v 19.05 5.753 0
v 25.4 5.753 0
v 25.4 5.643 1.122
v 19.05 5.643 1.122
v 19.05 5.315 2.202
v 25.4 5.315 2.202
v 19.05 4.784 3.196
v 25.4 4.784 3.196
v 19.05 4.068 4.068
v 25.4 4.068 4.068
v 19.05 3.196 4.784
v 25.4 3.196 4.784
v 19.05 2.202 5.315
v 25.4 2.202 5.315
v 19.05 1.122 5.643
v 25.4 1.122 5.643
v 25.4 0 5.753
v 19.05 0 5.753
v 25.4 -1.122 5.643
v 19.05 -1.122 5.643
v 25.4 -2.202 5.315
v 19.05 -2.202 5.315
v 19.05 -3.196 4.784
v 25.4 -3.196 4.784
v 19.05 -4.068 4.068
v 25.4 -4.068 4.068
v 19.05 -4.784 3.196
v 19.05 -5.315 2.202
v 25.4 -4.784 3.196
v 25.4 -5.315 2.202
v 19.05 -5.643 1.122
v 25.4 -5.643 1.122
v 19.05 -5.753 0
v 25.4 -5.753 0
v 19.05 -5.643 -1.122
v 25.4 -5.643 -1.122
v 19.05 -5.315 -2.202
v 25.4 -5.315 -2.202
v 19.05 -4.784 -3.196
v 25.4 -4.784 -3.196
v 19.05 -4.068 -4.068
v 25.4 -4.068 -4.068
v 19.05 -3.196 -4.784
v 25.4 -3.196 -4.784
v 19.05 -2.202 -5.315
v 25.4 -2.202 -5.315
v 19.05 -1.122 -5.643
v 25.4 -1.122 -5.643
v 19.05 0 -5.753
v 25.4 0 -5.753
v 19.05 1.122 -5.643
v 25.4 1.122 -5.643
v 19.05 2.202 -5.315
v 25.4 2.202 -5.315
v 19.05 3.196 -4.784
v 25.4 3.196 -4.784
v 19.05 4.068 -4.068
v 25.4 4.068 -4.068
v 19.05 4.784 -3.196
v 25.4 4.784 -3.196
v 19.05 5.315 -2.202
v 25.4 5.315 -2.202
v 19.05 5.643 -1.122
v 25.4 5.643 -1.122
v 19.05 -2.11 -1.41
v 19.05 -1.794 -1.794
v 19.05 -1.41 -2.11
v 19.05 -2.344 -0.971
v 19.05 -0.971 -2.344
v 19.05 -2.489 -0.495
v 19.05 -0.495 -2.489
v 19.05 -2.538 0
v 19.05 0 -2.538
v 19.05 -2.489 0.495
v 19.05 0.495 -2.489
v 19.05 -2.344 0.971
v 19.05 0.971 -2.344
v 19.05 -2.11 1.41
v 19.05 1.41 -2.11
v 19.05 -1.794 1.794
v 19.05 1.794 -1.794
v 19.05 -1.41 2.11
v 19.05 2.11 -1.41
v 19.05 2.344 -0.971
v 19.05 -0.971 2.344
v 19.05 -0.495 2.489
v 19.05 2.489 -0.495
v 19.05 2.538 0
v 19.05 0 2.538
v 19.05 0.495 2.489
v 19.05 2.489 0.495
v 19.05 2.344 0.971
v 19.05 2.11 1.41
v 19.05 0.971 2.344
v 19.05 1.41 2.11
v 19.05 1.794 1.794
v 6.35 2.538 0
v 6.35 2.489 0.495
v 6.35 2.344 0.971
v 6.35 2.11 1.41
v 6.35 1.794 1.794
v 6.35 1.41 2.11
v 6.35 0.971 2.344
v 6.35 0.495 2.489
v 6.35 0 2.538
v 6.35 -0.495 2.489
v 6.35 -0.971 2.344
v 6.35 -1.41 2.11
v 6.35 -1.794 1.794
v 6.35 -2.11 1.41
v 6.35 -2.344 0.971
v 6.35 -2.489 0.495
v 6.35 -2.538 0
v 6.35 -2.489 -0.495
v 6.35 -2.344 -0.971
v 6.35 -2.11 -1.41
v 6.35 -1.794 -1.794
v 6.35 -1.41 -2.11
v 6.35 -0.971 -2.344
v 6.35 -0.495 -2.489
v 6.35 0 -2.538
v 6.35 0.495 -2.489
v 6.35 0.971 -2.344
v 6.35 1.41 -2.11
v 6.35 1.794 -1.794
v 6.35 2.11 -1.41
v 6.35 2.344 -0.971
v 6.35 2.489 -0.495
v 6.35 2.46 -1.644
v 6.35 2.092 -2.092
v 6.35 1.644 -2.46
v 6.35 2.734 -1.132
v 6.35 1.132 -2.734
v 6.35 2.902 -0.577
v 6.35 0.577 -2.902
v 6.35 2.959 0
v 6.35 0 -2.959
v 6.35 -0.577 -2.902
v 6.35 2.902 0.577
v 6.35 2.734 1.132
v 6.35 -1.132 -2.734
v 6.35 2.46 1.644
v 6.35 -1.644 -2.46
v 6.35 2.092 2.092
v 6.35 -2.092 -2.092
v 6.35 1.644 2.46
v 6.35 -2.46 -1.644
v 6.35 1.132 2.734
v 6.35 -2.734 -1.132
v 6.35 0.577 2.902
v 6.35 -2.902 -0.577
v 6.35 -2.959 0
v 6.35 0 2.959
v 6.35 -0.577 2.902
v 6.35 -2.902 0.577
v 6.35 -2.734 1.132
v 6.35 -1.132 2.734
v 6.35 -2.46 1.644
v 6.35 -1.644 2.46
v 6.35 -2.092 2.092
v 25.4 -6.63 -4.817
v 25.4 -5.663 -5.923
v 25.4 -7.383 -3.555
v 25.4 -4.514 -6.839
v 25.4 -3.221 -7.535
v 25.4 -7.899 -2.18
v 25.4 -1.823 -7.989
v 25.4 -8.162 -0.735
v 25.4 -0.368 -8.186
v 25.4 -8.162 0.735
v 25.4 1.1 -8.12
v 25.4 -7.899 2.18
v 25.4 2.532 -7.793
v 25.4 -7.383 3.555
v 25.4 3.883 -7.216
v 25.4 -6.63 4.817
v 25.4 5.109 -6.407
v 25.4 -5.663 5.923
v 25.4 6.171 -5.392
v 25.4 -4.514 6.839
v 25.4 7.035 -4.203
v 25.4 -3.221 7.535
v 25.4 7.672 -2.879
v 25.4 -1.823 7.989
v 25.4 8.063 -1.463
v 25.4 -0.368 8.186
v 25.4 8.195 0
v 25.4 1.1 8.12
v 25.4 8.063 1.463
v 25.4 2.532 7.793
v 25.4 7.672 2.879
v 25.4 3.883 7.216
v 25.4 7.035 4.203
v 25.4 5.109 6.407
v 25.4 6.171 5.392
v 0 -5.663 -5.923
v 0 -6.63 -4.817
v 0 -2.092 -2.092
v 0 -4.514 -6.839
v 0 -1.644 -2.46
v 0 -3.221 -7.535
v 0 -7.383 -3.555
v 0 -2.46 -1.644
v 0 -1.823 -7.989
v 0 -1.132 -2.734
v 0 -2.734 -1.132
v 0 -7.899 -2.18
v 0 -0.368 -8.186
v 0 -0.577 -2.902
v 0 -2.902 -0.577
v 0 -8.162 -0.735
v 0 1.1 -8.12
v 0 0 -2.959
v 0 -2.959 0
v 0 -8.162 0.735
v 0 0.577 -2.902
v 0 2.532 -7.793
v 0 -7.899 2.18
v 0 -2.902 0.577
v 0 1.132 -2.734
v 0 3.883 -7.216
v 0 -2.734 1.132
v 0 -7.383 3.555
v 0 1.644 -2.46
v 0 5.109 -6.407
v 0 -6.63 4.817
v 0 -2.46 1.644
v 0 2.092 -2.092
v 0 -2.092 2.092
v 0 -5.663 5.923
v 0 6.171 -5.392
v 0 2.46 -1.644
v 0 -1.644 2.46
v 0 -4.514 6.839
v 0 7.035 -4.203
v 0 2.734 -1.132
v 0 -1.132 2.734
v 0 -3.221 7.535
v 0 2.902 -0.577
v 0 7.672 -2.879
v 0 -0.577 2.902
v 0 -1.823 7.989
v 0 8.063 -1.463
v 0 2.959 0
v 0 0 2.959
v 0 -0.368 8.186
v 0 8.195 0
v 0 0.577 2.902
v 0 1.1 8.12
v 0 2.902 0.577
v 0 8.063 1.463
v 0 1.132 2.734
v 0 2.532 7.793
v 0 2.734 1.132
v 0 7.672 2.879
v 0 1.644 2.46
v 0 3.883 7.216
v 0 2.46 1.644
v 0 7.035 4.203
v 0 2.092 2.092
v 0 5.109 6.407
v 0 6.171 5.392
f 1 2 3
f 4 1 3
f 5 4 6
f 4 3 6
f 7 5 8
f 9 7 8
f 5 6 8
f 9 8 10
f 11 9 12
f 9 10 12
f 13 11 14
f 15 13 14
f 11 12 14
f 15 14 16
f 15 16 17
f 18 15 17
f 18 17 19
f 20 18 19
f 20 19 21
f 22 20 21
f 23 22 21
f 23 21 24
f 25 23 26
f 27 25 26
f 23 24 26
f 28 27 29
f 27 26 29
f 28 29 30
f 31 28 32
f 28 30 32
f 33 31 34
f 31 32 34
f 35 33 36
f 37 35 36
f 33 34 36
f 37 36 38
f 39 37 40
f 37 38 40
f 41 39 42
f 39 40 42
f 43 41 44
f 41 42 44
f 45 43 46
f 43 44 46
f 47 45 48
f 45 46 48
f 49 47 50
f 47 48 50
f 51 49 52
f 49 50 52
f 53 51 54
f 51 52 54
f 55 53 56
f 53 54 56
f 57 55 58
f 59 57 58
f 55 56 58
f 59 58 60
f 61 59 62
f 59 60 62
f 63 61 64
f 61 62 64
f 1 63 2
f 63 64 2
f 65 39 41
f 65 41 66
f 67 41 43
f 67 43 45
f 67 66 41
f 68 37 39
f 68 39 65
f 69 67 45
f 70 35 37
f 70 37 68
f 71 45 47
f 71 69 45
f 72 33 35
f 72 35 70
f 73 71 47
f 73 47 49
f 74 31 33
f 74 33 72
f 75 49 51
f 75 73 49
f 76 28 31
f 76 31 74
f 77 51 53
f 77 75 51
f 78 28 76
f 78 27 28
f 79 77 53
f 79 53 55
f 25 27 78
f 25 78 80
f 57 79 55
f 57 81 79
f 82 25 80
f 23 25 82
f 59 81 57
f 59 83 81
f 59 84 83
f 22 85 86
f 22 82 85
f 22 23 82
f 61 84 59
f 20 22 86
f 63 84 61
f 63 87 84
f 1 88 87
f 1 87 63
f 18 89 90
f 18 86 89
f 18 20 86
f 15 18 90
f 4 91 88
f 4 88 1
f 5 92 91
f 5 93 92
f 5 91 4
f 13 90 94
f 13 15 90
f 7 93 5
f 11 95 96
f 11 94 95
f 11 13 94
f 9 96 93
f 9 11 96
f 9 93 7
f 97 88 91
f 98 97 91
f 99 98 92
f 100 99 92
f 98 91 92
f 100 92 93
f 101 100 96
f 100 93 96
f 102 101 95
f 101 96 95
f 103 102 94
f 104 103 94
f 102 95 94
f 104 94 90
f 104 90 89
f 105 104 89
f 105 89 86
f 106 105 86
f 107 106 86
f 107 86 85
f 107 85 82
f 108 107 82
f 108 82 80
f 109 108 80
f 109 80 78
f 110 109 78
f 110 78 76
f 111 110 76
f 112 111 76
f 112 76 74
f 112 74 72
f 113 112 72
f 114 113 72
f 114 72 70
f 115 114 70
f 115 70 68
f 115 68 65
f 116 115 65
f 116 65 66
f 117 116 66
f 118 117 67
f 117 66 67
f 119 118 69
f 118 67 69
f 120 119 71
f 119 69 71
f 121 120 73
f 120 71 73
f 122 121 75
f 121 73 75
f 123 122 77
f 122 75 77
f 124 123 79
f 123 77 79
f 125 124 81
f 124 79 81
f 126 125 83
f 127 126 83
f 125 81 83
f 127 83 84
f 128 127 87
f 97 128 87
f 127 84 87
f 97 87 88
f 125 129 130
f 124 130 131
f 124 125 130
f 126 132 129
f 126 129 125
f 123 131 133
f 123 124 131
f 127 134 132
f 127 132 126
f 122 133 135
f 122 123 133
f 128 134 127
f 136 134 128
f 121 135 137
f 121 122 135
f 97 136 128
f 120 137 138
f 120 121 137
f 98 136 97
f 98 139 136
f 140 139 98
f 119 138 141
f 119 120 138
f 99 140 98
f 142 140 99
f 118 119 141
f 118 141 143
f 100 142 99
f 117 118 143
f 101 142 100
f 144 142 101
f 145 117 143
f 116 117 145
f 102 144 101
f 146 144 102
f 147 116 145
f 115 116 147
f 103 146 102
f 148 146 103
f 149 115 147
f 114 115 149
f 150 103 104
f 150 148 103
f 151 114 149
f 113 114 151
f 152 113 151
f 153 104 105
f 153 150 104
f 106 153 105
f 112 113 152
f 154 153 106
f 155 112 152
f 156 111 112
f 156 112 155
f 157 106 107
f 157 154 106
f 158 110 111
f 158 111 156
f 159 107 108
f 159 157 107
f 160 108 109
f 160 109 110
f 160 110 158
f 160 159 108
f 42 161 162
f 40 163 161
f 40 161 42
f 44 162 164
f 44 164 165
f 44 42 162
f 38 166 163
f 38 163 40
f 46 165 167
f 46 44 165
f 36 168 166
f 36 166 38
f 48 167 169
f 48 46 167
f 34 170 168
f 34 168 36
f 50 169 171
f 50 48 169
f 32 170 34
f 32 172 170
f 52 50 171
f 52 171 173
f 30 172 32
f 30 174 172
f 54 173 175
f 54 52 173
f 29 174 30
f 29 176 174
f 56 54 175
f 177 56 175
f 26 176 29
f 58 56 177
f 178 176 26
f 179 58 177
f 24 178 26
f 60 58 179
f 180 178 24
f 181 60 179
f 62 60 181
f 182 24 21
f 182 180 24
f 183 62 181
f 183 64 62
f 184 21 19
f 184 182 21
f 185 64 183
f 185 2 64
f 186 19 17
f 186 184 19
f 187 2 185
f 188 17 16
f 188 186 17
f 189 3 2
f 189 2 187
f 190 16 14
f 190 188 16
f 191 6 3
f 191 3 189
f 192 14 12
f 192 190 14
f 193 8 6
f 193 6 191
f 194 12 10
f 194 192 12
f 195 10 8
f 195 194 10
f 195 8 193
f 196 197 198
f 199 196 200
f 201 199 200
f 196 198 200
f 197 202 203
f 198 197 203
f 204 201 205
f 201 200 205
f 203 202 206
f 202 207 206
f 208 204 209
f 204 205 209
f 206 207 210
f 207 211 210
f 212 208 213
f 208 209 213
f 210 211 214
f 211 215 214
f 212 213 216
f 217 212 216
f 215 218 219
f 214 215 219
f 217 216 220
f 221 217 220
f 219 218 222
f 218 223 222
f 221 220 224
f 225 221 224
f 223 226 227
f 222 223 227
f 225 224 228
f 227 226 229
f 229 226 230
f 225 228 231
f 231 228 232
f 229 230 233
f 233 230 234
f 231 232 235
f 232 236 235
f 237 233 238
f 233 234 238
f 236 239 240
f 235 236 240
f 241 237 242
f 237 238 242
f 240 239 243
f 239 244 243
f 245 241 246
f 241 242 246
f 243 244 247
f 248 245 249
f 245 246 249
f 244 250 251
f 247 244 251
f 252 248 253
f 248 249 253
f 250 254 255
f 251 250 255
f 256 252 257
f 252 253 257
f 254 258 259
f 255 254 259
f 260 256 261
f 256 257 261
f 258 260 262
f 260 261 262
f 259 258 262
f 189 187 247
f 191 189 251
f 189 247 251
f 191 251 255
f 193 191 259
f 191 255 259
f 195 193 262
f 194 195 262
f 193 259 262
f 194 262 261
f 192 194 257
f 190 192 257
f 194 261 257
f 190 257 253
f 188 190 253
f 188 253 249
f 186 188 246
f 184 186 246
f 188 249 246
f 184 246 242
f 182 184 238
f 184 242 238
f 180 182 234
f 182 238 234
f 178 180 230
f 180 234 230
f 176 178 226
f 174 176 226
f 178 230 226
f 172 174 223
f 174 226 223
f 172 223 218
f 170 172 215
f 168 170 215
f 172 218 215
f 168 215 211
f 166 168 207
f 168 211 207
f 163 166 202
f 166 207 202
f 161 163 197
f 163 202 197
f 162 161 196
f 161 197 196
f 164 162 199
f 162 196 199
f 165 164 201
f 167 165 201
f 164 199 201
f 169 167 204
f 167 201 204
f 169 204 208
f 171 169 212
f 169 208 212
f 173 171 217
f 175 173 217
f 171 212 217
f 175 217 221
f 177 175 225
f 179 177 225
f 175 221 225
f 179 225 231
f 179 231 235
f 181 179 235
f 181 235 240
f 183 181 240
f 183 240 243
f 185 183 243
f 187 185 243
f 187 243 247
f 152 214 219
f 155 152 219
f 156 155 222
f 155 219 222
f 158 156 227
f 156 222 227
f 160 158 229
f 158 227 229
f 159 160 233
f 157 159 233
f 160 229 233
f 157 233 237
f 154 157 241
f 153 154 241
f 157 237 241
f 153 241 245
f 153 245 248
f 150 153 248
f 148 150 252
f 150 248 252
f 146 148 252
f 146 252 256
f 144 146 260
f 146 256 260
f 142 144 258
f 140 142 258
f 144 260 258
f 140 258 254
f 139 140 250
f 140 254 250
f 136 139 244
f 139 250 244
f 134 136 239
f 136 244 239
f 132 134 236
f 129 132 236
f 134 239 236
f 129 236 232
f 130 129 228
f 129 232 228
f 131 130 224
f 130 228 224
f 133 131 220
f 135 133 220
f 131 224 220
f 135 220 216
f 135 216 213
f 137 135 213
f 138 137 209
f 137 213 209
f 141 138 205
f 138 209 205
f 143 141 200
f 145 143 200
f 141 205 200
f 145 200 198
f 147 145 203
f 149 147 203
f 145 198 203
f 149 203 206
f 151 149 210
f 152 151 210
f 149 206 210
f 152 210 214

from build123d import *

# Parameters (mm, degrees)
F0_R     = 8.194552
F1_DEPTH = 25.4
F2_R     = 5.7531
F3_DEPTH = 6.35
F4_R     = 2.537622
F5_DEPTH = 19.051
F6_R     = 2.9591
F7_DEPTH = 6.35


with BuildPart() as f1:
    # F0 (on Right) → F1 (new body)
    with BuildSketch(Plane.YZ):
        Circle(F0_R)
    extrude(amount=F1_DEPTH)

    # F2 (on face) → F3 (cut)
    with BuildSketch(Plane.YZ.offset(25.4)):
        Circle(F2_R)
    extrude(amount=-F3_DEPTH, mode=Mode.SUBTRACT)

    # F4 (on face) → F5 (cut, through all)
    with BuildSketch(Plane.YZ.offset(19.05)):
        Circle(F4_R)
    extrude(amount=-F5_DEPTH, mode=Mode.SUBTRACT)

    # F6 (on face) → F7 (cut)
    with BuildSketch(Plane(origin=(0, 0, 0), x_dir=(0, -1, 0), z_dir=(-1, 0, 0))):
        Circle(F6_R)
    extrude(amount=-F7_DEPTH, mode=Mode.SUBTRACT)


solid = f1.part
